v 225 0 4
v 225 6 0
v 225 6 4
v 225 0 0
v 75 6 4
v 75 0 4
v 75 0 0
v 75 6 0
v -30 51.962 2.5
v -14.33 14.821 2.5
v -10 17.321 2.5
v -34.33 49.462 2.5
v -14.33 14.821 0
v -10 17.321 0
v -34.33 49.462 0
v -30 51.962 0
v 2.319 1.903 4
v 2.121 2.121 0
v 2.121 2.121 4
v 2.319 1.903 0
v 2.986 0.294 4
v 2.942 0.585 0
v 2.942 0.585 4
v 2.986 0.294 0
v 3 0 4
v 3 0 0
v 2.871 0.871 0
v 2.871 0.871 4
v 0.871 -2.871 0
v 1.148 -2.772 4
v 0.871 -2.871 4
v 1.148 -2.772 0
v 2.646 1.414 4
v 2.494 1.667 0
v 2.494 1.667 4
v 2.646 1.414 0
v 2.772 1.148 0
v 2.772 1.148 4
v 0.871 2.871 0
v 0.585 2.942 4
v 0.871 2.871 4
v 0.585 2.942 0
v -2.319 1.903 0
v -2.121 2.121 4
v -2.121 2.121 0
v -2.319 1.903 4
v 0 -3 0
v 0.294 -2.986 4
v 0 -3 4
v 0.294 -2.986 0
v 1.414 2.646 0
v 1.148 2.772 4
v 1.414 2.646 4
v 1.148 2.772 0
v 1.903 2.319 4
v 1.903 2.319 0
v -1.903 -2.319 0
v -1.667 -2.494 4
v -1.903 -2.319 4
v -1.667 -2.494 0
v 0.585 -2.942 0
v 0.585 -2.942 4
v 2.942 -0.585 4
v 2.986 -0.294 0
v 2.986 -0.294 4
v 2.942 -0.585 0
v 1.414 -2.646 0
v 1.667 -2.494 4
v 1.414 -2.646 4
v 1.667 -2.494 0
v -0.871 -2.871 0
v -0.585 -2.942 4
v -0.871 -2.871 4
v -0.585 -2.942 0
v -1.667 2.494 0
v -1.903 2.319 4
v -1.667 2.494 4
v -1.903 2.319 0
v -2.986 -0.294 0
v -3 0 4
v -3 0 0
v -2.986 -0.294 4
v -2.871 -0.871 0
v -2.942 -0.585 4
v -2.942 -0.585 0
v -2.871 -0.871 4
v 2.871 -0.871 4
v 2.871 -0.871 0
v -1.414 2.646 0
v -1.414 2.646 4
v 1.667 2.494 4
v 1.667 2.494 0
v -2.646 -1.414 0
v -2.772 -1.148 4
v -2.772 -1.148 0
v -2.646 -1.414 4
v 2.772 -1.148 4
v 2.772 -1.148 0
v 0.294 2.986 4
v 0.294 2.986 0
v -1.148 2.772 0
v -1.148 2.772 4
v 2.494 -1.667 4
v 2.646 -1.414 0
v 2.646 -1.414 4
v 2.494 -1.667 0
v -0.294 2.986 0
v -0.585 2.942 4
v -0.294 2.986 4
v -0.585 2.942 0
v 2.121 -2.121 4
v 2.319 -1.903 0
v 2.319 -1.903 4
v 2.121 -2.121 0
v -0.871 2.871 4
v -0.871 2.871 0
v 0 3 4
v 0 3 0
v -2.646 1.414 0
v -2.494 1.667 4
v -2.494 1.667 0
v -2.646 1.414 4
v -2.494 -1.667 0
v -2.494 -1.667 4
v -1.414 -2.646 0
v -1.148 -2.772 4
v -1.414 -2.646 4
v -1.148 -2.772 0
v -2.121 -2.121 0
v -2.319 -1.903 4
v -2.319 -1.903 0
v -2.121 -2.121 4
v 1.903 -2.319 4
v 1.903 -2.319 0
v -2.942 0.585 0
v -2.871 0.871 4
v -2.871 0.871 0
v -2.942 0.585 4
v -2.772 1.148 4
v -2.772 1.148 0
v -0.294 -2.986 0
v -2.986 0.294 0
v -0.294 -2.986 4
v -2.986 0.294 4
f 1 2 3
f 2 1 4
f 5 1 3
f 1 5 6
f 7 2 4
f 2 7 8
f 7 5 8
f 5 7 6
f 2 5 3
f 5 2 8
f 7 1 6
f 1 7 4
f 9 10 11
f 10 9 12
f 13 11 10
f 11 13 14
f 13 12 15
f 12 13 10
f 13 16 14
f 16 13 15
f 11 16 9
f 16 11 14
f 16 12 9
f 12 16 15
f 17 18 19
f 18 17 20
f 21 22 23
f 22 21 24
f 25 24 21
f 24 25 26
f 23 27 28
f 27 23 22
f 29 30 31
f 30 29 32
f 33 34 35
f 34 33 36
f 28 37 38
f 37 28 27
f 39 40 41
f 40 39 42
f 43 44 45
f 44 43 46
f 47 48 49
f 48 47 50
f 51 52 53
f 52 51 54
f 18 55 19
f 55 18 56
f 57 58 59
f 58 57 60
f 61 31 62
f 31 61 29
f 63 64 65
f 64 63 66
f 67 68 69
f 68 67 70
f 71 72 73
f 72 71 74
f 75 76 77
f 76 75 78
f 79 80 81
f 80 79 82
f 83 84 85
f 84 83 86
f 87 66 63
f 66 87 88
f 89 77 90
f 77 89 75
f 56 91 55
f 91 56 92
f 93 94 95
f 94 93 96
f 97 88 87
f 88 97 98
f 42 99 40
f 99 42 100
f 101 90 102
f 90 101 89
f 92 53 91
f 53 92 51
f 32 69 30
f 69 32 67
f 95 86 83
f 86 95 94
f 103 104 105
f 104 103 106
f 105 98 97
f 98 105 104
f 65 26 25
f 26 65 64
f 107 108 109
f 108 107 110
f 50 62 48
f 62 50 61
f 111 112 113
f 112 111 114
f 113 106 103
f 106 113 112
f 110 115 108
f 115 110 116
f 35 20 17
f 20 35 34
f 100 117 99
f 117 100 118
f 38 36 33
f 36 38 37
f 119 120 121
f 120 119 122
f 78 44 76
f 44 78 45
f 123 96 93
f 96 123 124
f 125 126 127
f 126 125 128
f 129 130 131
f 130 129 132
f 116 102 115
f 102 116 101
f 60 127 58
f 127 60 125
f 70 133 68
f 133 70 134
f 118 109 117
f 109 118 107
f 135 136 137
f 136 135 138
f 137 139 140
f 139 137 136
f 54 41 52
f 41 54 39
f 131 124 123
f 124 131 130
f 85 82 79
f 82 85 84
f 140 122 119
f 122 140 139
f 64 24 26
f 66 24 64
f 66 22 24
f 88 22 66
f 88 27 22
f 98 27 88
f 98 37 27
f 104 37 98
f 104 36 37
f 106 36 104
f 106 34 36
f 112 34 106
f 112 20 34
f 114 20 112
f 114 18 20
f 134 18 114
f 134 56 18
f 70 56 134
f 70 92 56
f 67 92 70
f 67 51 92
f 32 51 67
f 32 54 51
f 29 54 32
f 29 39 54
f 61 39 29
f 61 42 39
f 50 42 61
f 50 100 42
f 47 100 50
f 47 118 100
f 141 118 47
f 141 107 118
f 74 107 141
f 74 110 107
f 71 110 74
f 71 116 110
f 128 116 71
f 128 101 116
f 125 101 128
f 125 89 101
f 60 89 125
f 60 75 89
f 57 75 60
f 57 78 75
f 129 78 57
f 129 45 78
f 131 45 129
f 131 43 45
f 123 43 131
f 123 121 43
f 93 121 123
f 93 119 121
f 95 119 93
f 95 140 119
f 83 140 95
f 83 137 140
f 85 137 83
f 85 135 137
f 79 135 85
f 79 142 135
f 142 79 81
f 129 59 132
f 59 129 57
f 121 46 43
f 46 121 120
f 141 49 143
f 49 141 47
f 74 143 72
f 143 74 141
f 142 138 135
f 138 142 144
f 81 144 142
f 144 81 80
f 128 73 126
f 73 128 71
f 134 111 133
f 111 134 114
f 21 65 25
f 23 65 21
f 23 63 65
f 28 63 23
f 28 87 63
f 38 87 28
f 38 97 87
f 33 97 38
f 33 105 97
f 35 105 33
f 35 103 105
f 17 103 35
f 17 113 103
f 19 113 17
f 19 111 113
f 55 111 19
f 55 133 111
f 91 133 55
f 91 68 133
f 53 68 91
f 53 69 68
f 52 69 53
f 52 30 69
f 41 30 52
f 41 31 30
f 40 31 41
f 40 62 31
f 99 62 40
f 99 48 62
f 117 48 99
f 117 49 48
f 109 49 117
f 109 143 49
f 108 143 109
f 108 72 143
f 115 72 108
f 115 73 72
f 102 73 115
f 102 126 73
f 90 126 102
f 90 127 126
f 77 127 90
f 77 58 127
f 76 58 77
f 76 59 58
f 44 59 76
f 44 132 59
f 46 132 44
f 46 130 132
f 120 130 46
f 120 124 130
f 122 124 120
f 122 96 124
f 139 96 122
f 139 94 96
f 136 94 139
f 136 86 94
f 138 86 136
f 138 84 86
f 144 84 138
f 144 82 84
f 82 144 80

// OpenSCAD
// L-shaped (hockey-stick) cell spreader for plating bacteria
// Dimensions measured in mm

// Handle dimensions
handle_length = 150;
handle_width = 6;
handle_thickness = 4;

// Foot dimensions
foot_length = 40;
foot_width = 5;
foot_thickness = 2.5;

// Boss dimensions
boss_diameter = 6;
boss_height = 4;

// Hanging hole
hole_diameter = 4;
hole_x = 143;

// Angle between handle (+X) and foot (120 deg CCW from +X)
foot_angle = 120;

// Resolution for curved shapes
$fn = 64;

// Main union of parts
union() {
    // Handle: lies along +X axis, centred in Y, z=0 to thickness
    translate([handle_length / 2, 0, 0])
        cube([handle_length, handle_width, handle_thickness], center = false);

    // Foot: rotated 120 degrees around Z, centred in its local Y, z=0 to foot_thickness
    rotate([0, 0, foot_angle])
        translate([foot_length / 2, 0, 0])
            cube([foot_length, foot_width, foot_thickness], center = false);

    // Boss at origin: cylinder centred at x=0, y=0, z=0 to boss_height
    translate([0, 0, 0])
        cylinder(h = boss_height, r = boss_diameter / 2, center = false);
}

// Hanging hole through handle at x=143, y=0
// Drill through the full height of the handle (and boss if it overlaps, but boss is at origin)
// The hole goes through z=0 to z=handle_thickness (and slightly more to ensure clean cut)
difference() {
    // This difference is applied to the whole model above, but we need to structure it properly.
    // Actually, in OpenSCAD, difference() applies to the first child and subtracts subsequent children.
    // So we must put the entire union inside a difference() with the hole.
}

// Correct structure: wrap everything in a difference()
// Re-writing the structure properly:

difference() {
    union() {
        // Handle
        translate([handle_length / 2, 0, 0])
            cube([handle_length, handle_width, handle_thickness], center = false);

        // Foot
        rotate([0, 0, foot_angle])
            translate([foot_length / 2, 0, 0])
                cube([foot_length, foot_width, foot_thickness], center = false);

        // Boss
        translate([0, 0, 0])
            cylinder(h = boss_height, r = boss_diameter / 2, center = false);
    }

    // Hanging hole: cylinder extending past the handle thickness
    translate([hole_x, 0, -0.5])
        cylinder(h = handle_thickness + 1, r = hole_diameter / 2, center = false);
}
